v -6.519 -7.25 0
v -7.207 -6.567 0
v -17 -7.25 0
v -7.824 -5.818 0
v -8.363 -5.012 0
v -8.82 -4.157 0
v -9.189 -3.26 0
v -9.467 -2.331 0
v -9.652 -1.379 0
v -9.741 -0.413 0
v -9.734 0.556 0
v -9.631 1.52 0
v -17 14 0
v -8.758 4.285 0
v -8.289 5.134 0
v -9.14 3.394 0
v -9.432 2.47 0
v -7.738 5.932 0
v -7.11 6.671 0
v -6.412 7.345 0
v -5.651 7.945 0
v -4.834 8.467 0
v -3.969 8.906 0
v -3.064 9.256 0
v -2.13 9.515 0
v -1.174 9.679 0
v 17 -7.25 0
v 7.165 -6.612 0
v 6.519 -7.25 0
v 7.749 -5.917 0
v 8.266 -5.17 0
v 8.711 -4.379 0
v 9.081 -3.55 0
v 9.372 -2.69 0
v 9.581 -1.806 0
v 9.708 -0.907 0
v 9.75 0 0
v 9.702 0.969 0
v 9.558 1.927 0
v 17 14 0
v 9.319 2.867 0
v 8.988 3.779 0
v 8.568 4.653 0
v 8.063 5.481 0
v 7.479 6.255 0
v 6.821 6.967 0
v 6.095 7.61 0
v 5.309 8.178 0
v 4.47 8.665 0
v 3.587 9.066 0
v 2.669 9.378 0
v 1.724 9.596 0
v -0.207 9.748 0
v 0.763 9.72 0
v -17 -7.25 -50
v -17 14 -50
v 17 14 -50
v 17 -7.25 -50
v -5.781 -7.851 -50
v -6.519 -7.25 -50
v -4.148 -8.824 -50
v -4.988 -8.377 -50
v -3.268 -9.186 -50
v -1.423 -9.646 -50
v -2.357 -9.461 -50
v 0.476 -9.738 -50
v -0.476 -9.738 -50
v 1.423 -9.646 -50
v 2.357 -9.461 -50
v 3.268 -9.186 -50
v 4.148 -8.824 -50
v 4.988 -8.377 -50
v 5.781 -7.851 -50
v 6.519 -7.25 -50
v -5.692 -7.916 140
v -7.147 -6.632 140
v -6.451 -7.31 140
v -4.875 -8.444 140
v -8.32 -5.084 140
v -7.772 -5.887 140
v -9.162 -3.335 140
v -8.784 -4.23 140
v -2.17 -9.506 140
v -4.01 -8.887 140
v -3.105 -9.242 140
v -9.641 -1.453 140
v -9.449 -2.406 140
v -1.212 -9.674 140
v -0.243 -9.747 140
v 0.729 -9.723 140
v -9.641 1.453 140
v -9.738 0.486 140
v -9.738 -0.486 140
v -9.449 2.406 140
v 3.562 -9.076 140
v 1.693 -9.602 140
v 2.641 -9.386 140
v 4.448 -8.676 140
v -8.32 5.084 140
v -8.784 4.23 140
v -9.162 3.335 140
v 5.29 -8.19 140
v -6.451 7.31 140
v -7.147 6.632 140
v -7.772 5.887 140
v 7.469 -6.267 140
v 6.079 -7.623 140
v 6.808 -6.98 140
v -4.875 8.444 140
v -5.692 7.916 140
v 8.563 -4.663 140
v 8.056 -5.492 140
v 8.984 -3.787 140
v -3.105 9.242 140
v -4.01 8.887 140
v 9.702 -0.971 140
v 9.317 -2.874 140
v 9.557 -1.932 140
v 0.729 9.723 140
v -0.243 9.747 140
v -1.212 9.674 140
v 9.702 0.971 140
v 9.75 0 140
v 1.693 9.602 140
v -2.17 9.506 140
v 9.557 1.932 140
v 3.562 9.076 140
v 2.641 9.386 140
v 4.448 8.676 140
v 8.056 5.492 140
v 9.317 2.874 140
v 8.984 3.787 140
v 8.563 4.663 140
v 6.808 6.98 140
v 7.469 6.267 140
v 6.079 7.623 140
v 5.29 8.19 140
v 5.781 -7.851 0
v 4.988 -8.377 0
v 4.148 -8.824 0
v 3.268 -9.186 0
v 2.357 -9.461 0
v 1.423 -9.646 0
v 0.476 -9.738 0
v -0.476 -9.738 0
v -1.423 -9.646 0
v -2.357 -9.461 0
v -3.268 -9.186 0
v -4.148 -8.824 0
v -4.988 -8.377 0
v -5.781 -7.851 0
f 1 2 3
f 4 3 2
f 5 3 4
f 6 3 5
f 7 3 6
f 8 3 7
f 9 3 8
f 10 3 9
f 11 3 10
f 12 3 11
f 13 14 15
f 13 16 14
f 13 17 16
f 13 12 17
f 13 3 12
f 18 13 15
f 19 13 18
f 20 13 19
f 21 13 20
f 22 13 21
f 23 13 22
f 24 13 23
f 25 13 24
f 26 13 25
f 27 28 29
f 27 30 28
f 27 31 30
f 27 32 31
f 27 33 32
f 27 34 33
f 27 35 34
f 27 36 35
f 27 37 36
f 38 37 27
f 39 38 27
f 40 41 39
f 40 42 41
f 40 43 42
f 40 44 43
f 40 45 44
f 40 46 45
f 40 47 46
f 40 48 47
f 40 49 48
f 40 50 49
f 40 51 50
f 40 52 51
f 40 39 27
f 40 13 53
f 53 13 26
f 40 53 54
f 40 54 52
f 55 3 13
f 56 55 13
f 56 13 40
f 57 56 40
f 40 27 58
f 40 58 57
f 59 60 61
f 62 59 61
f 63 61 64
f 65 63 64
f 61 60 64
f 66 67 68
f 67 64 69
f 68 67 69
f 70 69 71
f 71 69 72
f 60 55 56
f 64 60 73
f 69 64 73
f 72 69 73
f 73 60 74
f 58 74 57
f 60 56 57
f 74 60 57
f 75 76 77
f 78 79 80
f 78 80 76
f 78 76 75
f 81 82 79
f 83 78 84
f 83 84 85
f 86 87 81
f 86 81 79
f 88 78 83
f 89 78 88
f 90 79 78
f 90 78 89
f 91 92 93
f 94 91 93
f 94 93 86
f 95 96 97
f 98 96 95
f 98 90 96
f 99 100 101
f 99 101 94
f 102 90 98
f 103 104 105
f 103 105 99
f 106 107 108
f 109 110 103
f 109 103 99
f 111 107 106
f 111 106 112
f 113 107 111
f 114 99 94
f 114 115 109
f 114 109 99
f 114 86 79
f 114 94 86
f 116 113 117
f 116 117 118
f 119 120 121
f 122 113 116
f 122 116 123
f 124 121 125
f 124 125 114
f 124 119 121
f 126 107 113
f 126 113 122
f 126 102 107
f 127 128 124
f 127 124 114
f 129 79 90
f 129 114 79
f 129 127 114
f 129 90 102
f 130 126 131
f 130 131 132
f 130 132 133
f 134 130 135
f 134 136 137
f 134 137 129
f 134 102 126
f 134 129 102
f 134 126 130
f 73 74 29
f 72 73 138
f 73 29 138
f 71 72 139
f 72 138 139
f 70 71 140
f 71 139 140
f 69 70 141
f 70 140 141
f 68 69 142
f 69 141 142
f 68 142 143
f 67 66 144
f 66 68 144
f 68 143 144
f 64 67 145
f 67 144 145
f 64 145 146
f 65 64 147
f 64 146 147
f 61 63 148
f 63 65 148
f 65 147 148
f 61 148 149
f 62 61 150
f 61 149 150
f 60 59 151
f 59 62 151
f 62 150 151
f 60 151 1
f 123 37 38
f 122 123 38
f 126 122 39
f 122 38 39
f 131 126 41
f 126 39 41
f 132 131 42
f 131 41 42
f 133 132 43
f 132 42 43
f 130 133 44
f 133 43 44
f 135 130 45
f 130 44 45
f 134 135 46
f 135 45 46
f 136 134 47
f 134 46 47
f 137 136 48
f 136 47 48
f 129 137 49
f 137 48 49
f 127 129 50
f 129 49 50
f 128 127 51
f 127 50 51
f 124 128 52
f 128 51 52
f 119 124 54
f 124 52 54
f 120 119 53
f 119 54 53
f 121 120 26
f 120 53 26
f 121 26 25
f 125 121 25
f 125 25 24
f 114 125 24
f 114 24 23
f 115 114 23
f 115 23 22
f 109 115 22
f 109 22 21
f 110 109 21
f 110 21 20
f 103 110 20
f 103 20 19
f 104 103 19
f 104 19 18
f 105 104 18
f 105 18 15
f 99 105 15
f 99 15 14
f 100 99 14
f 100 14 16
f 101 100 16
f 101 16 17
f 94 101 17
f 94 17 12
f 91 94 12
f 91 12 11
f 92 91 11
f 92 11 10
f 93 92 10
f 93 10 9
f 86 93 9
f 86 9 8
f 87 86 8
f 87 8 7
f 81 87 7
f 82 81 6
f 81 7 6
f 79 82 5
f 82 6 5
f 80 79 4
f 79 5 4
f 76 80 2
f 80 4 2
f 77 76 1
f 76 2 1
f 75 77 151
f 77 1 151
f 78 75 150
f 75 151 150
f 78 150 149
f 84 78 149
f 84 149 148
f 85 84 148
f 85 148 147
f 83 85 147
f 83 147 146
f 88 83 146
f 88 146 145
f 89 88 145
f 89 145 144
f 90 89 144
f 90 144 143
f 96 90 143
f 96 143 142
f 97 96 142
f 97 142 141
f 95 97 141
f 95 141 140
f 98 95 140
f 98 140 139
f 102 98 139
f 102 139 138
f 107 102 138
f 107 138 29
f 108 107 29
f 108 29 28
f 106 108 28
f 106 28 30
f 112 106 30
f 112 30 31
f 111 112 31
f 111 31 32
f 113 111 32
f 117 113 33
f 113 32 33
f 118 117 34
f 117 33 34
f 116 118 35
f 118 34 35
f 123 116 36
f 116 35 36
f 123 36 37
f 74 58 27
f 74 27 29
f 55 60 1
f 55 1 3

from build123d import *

# Parameters (mm, degrees)
SKETCH_1_R          = 9.75
EXTRUDE_1_DEPTH     = 140
SKETCH_2_W          = 34
SKETCH_2_H          = 24
EXTRUDE_2_DEPTH     = 50
CUT_EXTRUDE_1_REACH = 143.722


with BuildPart() as part:
    # 스케치1 → 보스-돌출1 (new body)
    with BuildSketch(Plane.XY):
        Circle(SKETCH_1_R)
    extrude(amount=EXTRUDE_1_DEPTH)

    # 스케치2 → 보스-돌출2 (add)
    with BuildSketch(Plane.XY):
        with Locations((0, 2)):
            Rectangle(SKETCH_2_W, SKETCH_2_H)
    extrude(amount=-EXTRUDE_2_DEPTH)

    # 스케치3 → 컷-돌출1 (cut, up to next)
    with BuildSketch(Plane.XY, mode=Mode.PRIVATE) as cut_extrude_1_sk1:
        with BuildLine():
            Line((-6.519202405, -7.25), (-17, -7.25))
            Line((-17, -7.25), (-17, -10))
            Line((-17, -10), (17, -10))
            Line((17, -10), (17, -7.25))
            Line((17, -7.25), (6.519202405, -7.25))
            ThreePointArc((6.519202405, -7.25), (0, -9.75), (-6.519202405, -7.25))
        make_face()
    cut_extrude_1_tool1 = extrude(cut_extrude_1_sk1.sketch, amount=-CUT_EXTRUDE_1_REACH, mode=Mode.PRIVATE) & part.part
    add(cut_extrude_1_tool1.solids().sort_by_distance((0, -9.784111, 0))[0], mode=Mode.SUBTRACT)


solid = part.part
